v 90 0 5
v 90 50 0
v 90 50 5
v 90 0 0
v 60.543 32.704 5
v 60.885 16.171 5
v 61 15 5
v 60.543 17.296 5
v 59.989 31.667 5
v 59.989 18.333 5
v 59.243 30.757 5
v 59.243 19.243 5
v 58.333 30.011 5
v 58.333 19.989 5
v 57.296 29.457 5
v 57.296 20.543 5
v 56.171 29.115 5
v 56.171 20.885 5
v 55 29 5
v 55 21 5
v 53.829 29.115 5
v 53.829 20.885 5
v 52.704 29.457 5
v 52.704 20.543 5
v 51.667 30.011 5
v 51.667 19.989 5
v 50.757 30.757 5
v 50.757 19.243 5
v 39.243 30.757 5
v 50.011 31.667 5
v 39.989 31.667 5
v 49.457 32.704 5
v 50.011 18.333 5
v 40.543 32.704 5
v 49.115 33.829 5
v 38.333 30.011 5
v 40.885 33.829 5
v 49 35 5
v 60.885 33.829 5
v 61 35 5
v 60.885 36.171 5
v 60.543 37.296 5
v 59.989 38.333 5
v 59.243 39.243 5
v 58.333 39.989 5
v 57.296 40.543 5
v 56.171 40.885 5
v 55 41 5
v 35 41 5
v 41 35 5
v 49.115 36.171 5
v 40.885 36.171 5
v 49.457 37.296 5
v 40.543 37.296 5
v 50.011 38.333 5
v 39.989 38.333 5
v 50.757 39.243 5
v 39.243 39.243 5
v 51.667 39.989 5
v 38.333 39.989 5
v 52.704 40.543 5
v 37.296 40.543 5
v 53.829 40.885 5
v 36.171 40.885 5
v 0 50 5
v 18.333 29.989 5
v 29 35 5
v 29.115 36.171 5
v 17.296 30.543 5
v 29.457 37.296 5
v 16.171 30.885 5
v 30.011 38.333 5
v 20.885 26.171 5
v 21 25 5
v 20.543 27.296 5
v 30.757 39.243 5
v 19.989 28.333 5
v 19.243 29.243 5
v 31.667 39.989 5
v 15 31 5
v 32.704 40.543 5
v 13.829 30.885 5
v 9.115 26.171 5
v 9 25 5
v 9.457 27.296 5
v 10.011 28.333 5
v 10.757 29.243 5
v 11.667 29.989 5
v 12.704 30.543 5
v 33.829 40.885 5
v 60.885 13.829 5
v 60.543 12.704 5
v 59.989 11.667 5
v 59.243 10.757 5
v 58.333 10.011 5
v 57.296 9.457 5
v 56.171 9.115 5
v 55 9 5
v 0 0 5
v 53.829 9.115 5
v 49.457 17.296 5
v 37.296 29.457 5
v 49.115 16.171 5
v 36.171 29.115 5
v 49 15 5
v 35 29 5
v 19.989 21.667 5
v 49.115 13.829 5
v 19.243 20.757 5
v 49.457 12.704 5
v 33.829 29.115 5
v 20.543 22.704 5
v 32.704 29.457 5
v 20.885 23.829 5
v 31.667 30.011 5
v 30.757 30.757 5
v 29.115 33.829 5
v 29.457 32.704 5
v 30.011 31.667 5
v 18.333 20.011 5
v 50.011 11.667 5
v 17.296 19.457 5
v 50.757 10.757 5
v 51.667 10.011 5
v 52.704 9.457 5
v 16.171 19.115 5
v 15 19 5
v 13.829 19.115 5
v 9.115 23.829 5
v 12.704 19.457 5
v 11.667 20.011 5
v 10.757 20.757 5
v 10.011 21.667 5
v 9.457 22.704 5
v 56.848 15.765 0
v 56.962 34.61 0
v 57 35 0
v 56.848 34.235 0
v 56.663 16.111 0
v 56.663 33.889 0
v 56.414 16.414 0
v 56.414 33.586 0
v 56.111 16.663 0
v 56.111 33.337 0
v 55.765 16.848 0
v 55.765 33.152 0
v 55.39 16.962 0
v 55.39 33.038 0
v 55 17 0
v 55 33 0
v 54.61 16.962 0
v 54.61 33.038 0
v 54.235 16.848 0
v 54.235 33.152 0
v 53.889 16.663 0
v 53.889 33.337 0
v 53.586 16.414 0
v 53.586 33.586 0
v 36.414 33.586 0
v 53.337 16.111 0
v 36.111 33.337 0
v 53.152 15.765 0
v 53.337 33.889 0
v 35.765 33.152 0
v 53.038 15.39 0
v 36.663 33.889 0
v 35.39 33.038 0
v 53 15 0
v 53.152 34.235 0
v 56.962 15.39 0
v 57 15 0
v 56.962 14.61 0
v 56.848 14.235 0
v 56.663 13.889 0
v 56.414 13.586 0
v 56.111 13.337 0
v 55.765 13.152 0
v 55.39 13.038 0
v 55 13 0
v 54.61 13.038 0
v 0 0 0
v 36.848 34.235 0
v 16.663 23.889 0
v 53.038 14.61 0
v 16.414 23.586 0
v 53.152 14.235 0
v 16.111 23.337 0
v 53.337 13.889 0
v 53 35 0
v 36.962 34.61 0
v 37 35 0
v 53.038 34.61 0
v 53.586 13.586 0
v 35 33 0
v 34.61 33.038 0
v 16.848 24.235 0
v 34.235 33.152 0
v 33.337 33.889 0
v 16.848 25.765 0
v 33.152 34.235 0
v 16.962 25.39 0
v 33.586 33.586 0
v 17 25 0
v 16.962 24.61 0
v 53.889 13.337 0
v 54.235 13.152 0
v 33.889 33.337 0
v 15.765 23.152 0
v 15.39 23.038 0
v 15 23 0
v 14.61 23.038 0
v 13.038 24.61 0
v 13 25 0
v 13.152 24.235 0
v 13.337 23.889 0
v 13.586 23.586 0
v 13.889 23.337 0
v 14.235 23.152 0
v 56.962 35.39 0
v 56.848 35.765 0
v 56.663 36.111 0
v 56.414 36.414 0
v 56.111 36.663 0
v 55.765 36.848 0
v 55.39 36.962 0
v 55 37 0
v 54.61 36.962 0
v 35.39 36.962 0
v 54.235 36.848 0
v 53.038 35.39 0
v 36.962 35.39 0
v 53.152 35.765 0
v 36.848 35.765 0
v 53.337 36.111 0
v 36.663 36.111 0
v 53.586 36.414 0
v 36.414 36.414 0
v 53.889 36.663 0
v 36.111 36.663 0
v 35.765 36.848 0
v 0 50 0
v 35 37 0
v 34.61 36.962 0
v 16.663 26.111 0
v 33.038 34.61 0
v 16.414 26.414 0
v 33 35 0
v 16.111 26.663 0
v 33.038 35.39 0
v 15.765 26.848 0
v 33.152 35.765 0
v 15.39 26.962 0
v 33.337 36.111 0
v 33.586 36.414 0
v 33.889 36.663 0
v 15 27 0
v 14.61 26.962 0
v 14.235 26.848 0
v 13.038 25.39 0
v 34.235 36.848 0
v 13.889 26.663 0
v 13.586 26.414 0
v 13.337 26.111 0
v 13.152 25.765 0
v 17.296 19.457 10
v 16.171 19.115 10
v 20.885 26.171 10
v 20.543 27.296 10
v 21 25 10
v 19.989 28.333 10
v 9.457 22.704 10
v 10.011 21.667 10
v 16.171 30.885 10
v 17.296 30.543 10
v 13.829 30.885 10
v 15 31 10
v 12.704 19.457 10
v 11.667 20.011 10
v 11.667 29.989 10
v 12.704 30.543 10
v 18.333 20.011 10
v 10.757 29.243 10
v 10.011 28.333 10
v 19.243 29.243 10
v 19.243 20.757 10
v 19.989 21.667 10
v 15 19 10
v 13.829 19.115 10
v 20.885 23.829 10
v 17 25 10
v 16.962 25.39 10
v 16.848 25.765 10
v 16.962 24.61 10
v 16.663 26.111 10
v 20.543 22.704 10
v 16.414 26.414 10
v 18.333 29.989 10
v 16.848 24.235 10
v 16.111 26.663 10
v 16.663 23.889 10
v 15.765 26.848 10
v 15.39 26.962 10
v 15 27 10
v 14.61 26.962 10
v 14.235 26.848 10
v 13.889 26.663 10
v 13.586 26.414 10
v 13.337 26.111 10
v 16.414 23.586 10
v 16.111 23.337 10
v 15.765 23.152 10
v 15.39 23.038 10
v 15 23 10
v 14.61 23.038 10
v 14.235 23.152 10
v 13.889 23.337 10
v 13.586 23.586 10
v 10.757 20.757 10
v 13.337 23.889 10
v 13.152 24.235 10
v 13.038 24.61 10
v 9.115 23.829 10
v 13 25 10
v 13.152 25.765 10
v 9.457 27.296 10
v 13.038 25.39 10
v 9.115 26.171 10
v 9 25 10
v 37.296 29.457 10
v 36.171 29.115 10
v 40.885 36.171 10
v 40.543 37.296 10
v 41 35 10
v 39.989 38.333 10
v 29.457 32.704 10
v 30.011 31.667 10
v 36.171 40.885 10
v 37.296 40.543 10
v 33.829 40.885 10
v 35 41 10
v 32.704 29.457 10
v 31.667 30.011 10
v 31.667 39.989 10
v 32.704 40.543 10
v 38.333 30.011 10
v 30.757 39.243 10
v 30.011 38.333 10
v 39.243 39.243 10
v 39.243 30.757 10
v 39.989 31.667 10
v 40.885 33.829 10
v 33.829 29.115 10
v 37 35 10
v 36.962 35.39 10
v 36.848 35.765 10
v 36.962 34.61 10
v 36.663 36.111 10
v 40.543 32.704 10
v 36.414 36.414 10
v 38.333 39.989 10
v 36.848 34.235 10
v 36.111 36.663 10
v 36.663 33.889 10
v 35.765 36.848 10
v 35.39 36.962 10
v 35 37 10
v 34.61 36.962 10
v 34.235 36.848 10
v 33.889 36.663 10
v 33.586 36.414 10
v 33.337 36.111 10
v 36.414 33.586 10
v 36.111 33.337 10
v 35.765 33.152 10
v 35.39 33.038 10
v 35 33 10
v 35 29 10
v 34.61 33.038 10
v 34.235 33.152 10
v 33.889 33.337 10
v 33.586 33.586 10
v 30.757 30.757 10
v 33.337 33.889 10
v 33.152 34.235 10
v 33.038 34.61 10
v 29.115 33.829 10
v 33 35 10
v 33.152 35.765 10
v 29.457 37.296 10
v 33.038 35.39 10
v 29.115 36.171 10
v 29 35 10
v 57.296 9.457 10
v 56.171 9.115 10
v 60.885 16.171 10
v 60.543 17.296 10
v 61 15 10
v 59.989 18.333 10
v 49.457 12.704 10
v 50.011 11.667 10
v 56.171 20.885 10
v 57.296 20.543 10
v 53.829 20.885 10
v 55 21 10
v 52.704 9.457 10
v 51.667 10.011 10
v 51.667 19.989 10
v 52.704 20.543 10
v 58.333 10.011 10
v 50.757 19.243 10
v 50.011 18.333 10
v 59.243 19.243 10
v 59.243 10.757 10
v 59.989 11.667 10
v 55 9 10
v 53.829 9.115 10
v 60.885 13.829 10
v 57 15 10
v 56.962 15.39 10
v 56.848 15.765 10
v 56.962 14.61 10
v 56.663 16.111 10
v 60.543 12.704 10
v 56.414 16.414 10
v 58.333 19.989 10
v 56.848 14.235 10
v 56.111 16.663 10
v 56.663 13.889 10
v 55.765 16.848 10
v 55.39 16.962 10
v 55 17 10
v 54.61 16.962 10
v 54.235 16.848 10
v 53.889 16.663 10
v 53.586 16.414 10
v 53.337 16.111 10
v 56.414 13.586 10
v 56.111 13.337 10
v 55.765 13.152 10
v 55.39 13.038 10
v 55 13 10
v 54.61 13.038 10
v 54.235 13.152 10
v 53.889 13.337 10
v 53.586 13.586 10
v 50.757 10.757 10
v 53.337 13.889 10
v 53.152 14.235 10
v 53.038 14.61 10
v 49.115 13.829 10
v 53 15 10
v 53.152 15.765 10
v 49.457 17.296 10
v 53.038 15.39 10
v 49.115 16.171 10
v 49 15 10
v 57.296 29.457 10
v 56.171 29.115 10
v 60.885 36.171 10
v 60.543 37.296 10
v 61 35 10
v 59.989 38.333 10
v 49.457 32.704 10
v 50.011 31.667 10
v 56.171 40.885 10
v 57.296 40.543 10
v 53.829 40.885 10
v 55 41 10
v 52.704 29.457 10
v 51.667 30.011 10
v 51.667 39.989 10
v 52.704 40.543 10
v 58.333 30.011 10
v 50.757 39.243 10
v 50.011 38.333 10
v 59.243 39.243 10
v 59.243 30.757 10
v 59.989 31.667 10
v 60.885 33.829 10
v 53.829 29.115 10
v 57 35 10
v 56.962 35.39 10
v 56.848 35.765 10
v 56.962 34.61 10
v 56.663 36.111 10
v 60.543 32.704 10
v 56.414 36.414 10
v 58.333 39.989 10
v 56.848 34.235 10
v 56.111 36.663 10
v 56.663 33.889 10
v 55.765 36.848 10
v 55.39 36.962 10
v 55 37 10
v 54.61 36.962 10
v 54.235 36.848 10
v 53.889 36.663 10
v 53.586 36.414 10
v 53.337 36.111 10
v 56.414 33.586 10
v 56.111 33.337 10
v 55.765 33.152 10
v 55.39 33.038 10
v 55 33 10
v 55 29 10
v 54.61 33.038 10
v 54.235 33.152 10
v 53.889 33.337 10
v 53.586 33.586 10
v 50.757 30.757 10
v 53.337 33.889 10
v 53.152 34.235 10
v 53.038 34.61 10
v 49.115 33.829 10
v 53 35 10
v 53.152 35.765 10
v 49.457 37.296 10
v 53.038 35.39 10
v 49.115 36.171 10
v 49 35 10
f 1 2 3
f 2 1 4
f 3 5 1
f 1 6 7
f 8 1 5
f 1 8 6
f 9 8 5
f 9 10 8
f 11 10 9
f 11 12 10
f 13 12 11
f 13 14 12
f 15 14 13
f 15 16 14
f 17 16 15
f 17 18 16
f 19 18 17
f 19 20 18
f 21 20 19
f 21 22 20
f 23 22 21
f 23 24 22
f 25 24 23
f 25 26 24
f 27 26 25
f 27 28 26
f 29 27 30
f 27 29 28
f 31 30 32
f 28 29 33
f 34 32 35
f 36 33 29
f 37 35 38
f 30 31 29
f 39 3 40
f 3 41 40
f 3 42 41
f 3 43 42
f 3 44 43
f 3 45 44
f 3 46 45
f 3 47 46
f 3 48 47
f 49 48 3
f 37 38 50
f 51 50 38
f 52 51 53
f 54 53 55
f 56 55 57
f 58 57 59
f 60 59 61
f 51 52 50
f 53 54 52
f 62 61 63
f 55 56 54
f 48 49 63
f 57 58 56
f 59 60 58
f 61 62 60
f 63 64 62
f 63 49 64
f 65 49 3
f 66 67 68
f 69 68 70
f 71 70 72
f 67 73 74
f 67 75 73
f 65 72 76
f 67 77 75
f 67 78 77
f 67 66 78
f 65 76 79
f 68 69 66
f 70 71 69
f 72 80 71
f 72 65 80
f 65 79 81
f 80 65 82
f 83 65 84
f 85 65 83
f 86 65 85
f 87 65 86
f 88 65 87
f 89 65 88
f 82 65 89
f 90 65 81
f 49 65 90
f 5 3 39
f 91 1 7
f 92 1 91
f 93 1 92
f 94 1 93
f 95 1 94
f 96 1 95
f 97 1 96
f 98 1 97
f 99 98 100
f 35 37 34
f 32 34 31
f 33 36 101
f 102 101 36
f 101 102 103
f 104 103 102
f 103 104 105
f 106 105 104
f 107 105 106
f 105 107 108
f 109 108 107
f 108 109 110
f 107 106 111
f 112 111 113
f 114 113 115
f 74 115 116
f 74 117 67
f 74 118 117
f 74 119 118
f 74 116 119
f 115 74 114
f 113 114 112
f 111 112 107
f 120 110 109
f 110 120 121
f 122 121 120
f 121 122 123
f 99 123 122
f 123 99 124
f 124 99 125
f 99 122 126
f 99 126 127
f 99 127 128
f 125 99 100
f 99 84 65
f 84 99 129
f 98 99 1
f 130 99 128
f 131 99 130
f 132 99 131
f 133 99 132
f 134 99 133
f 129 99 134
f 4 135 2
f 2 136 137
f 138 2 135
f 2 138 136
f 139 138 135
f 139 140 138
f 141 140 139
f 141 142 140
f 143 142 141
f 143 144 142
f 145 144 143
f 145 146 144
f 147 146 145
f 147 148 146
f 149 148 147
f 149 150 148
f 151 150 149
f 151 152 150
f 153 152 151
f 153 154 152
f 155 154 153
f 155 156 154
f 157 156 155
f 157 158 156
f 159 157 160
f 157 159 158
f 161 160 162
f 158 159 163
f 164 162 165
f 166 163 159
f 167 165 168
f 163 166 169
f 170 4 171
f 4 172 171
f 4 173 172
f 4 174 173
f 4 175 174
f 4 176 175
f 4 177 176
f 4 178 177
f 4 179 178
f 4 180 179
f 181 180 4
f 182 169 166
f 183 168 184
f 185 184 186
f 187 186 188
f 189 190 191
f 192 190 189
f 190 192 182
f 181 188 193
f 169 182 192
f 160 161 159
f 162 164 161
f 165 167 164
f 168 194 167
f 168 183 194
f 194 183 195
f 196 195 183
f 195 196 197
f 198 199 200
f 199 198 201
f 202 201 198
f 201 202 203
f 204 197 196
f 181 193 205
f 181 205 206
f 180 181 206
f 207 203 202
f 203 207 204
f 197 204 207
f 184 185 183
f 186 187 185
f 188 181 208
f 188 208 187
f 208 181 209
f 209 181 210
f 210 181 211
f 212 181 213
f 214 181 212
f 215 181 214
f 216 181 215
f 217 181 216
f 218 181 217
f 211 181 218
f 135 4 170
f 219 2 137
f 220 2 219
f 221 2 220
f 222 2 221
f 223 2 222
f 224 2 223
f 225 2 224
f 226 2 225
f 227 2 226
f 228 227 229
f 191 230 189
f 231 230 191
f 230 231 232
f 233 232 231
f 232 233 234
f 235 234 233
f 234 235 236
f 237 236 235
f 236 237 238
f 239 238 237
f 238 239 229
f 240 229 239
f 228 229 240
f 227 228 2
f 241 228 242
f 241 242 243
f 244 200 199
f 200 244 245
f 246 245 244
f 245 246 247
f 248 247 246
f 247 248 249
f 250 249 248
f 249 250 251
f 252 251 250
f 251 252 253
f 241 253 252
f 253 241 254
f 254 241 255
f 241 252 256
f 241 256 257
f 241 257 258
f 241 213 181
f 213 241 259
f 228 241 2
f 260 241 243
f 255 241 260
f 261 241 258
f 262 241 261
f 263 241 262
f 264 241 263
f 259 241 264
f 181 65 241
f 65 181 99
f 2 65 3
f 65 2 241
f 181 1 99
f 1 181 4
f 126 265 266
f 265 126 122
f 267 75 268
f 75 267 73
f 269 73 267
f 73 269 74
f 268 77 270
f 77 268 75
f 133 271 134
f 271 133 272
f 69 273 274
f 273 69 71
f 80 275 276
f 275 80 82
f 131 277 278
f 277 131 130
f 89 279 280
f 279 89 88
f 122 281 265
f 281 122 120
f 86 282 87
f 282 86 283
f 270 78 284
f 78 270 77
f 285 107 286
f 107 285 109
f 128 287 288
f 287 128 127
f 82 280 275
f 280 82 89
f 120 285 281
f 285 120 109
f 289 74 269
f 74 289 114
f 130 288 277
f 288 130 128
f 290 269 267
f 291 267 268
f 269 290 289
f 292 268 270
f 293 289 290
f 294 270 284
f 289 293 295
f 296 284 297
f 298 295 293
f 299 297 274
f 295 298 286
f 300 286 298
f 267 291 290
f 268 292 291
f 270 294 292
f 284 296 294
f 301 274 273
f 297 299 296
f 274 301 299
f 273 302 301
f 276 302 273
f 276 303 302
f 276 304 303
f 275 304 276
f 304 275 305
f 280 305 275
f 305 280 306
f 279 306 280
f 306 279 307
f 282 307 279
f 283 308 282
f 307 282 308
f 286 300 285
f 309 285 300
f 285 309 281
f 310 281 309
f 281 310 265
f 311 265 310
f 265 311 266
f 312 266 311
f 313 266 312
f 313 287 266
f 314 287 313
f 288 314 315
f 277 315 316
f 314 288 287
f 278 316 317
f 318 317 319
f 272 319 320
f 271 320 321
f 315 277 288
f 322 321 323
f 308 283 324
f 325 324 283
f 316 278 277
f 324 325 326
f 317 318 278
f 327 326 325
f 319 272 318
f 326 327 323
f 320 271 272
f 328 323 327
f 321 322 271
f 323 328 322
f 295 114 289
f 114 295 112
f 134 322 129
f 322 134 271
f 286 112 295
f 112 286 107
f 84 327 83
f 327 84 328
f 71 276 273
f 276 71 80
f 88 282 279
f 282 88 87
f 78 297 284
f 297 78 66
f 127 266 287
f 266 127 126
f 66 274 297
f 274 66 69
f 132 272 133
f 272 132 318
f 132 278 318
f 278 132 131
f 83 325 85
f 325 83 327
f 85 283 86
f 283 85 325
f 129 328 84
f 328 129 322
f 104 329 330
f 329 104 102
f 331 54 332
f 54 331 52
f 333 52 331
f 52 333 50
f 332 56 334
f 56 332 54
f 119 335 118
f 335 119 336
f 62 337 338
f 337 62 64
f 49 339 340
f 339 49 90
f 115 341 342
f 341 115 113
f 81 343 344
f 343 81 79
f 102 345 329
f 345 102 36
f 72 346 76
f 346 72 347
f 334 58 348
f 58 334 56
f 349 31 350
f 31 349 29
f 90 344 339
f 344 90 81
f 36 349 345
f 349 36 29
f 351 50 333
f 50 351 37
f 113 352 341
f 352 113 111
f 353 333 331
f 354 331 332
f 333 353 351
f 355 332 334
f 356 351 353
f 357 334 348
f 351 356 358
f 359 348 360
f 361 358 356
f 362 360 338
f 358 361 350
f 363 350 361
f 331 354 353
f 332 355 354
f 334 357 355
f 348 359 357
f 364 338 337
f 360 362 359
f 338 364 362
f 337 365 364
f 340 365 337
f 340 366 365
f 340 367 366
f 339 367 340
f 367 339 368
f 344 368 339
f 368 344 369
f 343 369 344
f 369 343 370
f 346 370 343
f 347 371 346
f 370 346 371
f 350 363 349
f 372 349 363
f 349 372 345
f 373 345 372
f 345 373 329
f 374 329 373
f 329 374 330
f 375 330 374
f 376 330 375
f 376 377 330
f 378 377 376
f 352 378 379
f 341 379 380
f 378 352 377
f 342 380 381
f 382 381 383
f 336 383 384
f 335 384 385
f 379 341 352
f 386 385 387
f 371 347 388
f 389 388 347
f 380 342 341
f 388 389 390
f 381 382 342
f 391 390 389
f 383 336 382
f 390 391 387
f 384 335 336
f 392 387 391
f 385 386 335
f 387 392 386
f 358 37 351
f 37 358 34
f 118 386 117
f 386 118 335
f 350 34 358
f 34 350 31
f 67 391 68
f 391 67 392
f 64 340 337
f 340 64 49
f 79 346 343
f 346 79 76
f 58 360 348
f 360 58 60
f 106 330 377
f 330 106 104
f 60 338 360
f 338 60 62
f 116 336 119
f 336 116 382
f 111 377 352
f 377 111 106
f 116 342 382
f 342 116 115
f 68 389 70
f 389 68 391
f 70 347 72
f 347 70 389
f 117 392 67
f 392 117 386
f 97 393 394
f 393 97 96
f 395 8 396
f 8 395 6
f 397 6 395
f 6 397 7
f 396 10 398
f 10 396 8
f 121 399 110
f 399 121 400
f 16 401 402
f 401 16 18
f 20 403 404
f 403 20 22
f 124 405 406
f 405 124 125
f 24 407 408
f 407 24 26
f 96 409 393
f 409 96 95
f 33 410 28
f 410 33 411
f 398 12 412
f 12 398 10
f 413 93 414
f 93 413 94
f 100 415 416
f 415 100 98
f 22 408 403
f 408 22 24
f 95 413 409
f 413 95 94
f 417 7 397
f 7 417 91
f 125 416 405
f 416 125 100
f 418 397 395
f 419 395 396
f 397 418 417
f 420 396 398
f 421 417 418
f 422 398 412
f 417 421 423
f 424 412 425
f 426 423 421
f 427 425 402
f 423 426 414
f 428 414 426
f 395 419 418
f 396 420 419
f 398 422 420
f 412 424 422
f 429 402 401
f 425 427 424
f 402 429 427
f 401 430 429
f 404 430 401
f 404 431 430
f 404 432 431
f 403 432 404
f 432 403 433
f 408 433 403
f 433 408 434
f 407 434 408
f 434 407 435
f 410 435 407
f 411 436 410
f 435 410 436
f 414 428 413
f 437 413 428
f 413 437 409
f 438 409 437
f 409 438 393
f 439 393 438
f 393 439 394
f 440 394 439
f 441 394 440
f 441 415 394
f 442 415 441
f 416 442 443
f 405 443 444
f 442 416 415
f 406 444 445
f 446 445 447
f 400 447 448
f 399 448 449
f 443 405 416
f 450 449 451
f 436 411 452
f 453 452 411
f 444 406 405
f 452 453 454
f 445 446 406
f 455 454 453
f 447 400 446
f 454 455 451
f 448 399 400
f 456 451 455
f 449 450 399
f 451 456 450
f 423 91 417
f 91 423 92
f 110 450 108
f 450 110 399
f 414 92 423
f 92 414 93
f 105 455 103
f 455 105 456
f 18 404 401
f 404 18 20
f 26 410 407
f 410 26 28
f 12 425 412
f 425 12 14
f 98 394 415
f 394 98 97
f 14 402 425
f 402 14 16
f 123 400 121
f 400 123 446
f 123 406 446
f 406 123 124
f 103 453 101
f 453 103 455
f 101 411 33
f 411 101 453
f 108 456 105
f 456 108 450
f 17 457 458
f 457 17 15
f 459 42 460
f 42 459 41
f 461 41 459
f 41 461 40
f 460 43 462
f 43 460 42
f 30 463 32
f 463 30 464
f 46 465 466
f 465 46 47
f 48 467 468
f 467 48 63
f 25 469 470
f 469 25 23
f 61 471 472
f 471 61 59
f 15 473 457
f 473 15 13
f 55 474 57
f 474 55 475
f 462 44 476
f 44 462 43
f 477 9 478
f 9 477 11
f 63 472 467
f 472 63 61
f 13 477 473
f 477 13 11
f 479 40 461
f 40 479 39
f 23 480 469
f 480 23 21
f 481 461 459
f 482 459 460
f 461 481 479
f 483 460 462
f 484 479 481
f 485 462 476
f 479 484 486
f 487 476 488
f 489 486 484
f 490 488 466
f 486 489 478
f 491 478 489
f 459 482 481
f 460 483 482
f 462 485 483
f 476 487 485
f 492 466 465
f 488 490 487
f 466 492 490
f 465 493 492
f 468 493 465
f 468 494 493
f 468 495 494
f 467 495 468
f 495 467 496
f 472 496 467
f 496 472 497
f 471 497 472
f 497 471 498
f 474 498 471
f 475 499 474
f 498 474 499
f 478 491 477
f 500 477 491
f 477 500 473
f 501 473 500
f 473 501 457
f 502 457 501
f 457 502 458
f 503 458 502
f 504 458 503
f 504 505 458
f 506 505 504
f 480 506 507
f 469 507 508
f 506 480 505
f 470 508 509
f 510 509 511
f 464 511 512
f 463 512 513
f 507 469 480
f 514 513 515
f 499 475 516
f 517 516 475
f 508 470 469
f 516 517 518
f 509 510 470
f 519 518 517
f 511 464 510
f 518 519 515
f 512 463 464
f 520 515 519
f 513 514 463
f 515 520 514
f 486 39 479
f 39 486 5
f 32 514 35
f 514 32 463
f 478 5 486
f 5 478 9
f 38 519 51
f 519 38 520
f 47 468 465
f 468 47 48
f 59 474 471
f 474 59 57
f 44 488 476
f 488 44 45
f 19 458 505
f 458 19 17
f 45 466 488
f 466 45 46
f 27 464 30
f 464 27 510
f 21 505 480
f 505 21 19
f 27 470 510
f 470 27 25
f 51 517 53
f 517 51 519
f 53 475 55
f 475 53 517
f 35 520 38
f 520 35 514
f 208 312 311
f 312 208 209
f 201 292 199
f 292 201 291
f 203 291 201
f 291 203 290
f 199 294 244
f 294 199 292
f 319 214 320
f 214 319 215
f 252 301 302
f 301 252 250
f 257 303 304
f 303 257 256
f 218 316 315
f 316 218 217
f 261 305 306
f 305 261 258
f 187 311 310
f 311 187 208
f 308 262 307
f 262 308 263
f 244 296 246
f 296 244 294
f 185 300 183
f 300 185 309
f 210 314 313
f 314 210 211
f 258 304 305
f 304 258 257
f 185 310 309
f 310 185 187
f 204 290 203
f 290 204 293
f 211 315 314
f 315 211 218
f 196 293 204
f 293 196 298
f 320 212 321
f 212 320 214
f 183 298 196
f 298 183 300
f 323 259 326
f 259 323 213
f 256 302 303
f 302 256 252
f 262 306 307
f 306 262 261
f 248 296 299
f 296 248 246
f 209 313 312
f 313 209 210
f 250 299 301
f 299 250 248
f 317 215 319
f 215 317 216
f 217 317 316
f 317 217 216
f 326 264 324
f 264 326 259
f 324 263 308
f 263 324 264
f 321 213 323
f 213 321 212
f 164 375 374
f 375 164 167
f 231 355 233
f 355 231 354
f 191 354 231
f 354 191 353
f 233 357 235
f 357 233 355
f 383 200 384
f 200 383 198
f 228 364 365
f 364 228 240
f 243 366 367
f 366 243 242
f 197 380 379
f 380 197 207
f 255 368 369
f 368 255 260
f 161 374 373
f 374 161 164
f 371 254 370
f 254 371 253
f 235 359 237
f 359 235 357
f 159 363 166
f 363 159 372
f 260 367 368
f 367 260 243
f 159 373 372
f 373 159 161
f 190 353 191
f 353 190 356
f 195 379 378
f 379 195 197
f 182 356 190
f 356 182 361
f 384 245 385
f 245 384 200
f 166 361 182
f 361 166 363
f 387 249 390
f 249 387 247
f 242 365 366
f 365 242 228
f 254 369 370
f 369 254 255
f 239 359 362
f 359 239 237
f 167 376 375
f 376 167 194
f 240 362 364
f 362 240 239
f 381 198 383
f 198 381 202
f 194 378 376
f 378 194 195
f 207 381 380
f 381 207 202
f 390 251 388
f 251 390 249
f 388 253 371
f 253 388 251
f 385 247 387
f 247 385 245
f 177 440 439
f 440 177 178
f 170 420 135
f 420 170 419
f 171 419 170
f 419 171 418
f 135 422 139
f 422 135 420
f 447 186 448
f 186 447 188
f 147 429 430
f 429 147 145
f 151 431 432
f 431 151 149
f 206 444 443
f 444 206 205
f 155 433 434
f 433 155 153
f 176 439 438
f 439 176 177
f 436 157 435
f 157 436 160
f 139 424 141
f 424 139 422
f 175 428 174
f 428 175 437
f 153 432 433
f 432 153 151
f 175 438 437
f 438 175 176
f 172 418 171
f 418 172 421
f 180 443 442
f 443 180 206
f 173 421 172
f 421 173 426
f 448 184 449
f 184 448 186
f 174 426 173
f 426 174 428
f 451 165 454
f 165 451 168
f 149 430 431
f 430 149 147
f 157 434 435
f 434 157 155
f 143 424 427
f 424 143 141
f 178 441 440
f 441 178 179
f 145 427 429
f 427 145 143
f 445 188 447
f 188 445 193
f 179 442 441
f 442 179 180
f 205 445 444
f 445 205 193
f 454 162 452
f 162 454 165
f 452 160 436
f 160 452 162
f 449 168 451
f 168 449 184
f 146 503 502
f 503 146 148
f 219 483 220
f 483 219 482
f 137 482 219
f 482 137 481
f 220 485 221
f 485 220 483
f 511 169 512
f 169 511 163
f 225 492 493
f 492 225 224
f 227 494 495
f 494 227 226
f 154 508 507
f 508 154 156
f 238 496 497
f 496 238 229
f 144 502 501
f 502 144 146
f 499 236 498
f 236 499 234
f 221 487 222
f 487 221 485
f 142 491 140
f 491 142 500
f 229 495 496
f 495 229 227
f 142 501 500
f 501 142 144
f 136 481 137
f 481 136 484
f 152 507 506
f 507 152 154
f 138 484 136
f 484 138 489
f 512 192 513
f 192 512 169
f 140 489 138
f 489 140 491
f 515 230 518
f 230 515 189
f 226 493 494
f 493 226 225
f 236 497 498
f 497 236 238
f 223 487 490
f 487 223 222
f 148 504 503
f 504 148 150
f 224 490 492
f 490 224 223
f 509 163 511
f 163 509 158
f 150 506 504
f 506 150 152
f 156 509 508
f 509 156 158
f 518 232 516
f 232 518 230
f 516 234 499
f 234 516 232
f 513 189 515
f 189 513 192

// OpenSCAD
$fn = 32;

// ----------------------------------------------------------------------
// Boss field: plate with bosses at given coordinates
// ----------------------------------------------------------------------

// --- parameters (mm) ---
plate_l = 90;             // plate length, X
plate_w = 50;             // plate width, Y
plate_t = 5;              // plate thickness, Z
boss_d = 12;              // boss diameter
boss_h = 5;               // boss height above the plate
bore_d = 4;               // boss bore

total_h = plate_t + boss_h;  // overall height

difference() {
  union() {
    cube([plate_l, plate_w, plate_t]);
    translate([15, 25, plate_t]) cylinder(h = boss_h, d = boss_d);
    translate([35, 35, plate_t]) cylinder(h = boss_h, d = boss_d);
    translate([55, 15, plate_t]) cylinder(h = boss_h, d = boss_d);
    translate([55, 35, plate_t]) cylinder(h = boss_h, d = boss_d);
  }
  translate([15, 25, -1]) cylinder(h = total_h + 2, d = bore_d);
  translate([35, 35, -1]) cylinder(h = total_h + 2, d = bore_d);
  translate([55, 15, -1]) cylinder(h = total_h + 2, d = bore_d);
  translate([55, 35, -1]) cylinder(h = total_h + 2, d = bore_d);
}
